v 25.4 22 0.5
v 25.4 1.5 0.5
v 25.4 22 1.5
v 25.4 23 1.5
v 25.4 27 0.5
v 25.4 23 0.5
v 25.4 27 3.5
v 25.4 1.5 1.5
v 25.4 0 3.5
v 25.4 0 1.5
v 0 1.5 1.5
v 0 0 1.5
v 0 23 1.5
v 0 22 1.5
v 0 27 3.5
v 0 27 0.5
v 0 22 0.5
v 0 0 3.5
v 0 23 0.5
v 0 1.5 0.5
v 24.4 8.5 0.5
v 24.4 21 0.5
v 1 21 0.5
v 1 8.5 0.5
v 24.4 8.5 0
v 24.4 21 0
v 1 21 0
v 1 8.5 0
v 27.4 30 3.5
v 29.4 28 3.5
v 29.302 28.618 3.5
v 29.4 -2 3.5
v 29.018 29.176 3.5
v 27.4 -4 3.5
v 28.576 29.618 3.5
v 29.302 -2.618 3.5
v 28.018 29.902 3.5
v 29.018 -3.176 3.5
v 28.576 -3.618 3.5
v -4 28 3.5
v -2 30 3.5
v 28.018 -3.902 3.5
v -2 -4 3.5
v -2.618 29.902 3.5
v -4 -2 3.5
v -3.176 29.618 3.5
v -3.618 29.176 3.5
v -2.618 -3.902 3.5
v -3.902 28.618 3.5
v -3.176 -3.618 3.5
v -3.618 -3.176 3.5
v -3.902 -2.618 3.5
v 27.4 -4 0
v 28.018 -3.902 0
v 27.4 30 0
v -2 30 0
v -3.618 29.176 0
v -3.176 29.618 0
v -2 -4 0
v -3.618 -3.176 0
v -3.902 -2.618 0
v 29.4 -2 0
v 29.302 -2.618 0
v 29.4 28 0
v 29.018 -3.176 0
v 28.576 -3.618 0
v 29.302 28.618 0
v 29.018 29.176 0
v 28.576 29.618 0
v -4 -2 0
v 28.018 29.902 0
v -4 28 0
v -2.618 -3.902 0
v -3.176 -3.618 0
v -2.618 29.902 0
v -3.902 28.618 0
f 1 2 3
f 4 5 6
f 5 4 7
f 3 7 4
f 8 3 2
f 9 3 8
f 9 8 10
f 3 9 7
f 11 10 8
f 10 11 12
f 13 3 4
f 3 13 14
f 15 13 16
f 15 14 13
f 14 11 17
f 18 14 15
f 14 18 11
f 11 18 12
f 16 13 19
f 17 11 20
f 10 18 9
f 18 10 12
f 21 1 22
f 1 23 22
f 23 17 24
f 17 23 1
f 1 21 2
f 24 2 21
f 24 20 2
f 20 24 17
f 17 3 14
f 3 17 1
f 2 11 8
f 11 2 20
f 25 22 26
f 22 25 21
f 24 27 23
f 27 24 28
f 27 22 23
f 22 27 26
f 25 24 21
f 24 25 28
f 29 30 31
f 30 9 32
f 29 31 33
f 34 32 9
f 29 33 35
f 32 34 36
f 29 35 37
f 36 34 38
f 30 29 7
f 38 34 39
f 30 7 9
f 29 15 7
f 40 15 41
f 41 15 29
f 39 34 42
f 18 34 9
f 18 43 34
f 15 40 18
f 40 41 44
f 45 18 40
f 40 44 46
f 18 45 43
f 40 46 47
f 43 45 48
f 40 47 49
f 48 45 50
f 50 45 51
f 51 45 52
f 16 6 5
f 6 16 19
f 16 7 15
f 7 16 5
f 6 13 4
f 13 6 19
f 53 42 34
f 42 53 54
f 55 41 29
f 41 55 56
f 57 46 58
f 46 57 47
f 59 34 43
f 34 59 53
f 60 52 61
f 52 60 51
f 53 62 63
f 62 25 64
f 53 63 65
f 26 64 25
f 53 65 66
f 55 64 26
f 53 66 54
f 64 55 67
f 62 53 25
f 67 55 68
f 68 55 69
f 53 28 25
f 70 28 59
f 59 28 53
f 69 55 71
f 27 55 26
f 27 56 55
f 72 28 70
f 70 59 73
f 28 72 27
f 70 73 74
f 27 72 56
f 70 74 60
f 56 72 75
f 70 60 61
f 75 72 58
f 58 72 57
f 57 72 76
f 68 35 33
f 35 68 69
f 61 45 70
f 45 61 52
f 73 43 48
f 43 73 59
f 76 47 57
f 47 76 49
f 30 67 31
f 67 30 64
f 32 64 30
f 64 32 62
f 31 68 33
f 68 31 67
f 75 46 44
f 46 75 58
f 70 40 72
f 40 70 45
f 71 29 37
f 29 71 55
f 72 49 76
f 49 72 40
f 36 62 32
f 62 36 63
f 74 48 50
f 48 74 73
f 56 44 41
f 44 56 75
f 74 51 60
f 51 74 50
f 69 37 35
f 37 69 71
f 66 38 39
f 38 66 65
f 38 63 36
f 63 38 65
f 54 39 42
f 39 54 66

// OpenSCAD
bodyWid     = 26;
bodyLen     = 25.4;
bodyDep     = 3;
windowLen   = 25;
windowOff   = 5;
windowDep   = 0.5;

epsilon     = 0.1;

$fn=20;

oled128x32 =[[0,4], [0,2.8], [1,2.8], [1,0.5], [8,0.5], [8,0], [33.5, 0], [33.5,2.8], [34.5, 2.8], [34.5, 0.5], [43, 0.5], [43,4]];


difference() {
   simpleForm();
//   translate([-1,bodyWid,0]) rotate([90,0,0]) linear_extrude(height=bodyWid) polygon(points=oled128x32);
   rough();
}
   
module simpleForm(h=3.5) {
   hull() {
      translate([-2,-2,0]) cylinder(r=2,h=h);
      translate([-2,2+bodyWid,0]) cylinder(r=2,h=h);
      translate([2+bodyLen,2+bodyWid,0]) cylinder(r=2,h=h);
      translate([2+bodyLen,-2,0]) cylinder(r=2,h=h);
   }
}

module rough() {
   translate([0,0,1.5]) cube([bodyLen, bodyWid, bodyDep]);
   translate([0,1.5,0.5]) cube([bodyLen, 20.5, bodyDep]);
   translate([1,8.5,-0.1]) cube([bodyLen-2, 12.5, bodyDep]);
   translate([0,23,0.5]) cube([bodyLen, bodyWid-22, bodyDep]);
}
